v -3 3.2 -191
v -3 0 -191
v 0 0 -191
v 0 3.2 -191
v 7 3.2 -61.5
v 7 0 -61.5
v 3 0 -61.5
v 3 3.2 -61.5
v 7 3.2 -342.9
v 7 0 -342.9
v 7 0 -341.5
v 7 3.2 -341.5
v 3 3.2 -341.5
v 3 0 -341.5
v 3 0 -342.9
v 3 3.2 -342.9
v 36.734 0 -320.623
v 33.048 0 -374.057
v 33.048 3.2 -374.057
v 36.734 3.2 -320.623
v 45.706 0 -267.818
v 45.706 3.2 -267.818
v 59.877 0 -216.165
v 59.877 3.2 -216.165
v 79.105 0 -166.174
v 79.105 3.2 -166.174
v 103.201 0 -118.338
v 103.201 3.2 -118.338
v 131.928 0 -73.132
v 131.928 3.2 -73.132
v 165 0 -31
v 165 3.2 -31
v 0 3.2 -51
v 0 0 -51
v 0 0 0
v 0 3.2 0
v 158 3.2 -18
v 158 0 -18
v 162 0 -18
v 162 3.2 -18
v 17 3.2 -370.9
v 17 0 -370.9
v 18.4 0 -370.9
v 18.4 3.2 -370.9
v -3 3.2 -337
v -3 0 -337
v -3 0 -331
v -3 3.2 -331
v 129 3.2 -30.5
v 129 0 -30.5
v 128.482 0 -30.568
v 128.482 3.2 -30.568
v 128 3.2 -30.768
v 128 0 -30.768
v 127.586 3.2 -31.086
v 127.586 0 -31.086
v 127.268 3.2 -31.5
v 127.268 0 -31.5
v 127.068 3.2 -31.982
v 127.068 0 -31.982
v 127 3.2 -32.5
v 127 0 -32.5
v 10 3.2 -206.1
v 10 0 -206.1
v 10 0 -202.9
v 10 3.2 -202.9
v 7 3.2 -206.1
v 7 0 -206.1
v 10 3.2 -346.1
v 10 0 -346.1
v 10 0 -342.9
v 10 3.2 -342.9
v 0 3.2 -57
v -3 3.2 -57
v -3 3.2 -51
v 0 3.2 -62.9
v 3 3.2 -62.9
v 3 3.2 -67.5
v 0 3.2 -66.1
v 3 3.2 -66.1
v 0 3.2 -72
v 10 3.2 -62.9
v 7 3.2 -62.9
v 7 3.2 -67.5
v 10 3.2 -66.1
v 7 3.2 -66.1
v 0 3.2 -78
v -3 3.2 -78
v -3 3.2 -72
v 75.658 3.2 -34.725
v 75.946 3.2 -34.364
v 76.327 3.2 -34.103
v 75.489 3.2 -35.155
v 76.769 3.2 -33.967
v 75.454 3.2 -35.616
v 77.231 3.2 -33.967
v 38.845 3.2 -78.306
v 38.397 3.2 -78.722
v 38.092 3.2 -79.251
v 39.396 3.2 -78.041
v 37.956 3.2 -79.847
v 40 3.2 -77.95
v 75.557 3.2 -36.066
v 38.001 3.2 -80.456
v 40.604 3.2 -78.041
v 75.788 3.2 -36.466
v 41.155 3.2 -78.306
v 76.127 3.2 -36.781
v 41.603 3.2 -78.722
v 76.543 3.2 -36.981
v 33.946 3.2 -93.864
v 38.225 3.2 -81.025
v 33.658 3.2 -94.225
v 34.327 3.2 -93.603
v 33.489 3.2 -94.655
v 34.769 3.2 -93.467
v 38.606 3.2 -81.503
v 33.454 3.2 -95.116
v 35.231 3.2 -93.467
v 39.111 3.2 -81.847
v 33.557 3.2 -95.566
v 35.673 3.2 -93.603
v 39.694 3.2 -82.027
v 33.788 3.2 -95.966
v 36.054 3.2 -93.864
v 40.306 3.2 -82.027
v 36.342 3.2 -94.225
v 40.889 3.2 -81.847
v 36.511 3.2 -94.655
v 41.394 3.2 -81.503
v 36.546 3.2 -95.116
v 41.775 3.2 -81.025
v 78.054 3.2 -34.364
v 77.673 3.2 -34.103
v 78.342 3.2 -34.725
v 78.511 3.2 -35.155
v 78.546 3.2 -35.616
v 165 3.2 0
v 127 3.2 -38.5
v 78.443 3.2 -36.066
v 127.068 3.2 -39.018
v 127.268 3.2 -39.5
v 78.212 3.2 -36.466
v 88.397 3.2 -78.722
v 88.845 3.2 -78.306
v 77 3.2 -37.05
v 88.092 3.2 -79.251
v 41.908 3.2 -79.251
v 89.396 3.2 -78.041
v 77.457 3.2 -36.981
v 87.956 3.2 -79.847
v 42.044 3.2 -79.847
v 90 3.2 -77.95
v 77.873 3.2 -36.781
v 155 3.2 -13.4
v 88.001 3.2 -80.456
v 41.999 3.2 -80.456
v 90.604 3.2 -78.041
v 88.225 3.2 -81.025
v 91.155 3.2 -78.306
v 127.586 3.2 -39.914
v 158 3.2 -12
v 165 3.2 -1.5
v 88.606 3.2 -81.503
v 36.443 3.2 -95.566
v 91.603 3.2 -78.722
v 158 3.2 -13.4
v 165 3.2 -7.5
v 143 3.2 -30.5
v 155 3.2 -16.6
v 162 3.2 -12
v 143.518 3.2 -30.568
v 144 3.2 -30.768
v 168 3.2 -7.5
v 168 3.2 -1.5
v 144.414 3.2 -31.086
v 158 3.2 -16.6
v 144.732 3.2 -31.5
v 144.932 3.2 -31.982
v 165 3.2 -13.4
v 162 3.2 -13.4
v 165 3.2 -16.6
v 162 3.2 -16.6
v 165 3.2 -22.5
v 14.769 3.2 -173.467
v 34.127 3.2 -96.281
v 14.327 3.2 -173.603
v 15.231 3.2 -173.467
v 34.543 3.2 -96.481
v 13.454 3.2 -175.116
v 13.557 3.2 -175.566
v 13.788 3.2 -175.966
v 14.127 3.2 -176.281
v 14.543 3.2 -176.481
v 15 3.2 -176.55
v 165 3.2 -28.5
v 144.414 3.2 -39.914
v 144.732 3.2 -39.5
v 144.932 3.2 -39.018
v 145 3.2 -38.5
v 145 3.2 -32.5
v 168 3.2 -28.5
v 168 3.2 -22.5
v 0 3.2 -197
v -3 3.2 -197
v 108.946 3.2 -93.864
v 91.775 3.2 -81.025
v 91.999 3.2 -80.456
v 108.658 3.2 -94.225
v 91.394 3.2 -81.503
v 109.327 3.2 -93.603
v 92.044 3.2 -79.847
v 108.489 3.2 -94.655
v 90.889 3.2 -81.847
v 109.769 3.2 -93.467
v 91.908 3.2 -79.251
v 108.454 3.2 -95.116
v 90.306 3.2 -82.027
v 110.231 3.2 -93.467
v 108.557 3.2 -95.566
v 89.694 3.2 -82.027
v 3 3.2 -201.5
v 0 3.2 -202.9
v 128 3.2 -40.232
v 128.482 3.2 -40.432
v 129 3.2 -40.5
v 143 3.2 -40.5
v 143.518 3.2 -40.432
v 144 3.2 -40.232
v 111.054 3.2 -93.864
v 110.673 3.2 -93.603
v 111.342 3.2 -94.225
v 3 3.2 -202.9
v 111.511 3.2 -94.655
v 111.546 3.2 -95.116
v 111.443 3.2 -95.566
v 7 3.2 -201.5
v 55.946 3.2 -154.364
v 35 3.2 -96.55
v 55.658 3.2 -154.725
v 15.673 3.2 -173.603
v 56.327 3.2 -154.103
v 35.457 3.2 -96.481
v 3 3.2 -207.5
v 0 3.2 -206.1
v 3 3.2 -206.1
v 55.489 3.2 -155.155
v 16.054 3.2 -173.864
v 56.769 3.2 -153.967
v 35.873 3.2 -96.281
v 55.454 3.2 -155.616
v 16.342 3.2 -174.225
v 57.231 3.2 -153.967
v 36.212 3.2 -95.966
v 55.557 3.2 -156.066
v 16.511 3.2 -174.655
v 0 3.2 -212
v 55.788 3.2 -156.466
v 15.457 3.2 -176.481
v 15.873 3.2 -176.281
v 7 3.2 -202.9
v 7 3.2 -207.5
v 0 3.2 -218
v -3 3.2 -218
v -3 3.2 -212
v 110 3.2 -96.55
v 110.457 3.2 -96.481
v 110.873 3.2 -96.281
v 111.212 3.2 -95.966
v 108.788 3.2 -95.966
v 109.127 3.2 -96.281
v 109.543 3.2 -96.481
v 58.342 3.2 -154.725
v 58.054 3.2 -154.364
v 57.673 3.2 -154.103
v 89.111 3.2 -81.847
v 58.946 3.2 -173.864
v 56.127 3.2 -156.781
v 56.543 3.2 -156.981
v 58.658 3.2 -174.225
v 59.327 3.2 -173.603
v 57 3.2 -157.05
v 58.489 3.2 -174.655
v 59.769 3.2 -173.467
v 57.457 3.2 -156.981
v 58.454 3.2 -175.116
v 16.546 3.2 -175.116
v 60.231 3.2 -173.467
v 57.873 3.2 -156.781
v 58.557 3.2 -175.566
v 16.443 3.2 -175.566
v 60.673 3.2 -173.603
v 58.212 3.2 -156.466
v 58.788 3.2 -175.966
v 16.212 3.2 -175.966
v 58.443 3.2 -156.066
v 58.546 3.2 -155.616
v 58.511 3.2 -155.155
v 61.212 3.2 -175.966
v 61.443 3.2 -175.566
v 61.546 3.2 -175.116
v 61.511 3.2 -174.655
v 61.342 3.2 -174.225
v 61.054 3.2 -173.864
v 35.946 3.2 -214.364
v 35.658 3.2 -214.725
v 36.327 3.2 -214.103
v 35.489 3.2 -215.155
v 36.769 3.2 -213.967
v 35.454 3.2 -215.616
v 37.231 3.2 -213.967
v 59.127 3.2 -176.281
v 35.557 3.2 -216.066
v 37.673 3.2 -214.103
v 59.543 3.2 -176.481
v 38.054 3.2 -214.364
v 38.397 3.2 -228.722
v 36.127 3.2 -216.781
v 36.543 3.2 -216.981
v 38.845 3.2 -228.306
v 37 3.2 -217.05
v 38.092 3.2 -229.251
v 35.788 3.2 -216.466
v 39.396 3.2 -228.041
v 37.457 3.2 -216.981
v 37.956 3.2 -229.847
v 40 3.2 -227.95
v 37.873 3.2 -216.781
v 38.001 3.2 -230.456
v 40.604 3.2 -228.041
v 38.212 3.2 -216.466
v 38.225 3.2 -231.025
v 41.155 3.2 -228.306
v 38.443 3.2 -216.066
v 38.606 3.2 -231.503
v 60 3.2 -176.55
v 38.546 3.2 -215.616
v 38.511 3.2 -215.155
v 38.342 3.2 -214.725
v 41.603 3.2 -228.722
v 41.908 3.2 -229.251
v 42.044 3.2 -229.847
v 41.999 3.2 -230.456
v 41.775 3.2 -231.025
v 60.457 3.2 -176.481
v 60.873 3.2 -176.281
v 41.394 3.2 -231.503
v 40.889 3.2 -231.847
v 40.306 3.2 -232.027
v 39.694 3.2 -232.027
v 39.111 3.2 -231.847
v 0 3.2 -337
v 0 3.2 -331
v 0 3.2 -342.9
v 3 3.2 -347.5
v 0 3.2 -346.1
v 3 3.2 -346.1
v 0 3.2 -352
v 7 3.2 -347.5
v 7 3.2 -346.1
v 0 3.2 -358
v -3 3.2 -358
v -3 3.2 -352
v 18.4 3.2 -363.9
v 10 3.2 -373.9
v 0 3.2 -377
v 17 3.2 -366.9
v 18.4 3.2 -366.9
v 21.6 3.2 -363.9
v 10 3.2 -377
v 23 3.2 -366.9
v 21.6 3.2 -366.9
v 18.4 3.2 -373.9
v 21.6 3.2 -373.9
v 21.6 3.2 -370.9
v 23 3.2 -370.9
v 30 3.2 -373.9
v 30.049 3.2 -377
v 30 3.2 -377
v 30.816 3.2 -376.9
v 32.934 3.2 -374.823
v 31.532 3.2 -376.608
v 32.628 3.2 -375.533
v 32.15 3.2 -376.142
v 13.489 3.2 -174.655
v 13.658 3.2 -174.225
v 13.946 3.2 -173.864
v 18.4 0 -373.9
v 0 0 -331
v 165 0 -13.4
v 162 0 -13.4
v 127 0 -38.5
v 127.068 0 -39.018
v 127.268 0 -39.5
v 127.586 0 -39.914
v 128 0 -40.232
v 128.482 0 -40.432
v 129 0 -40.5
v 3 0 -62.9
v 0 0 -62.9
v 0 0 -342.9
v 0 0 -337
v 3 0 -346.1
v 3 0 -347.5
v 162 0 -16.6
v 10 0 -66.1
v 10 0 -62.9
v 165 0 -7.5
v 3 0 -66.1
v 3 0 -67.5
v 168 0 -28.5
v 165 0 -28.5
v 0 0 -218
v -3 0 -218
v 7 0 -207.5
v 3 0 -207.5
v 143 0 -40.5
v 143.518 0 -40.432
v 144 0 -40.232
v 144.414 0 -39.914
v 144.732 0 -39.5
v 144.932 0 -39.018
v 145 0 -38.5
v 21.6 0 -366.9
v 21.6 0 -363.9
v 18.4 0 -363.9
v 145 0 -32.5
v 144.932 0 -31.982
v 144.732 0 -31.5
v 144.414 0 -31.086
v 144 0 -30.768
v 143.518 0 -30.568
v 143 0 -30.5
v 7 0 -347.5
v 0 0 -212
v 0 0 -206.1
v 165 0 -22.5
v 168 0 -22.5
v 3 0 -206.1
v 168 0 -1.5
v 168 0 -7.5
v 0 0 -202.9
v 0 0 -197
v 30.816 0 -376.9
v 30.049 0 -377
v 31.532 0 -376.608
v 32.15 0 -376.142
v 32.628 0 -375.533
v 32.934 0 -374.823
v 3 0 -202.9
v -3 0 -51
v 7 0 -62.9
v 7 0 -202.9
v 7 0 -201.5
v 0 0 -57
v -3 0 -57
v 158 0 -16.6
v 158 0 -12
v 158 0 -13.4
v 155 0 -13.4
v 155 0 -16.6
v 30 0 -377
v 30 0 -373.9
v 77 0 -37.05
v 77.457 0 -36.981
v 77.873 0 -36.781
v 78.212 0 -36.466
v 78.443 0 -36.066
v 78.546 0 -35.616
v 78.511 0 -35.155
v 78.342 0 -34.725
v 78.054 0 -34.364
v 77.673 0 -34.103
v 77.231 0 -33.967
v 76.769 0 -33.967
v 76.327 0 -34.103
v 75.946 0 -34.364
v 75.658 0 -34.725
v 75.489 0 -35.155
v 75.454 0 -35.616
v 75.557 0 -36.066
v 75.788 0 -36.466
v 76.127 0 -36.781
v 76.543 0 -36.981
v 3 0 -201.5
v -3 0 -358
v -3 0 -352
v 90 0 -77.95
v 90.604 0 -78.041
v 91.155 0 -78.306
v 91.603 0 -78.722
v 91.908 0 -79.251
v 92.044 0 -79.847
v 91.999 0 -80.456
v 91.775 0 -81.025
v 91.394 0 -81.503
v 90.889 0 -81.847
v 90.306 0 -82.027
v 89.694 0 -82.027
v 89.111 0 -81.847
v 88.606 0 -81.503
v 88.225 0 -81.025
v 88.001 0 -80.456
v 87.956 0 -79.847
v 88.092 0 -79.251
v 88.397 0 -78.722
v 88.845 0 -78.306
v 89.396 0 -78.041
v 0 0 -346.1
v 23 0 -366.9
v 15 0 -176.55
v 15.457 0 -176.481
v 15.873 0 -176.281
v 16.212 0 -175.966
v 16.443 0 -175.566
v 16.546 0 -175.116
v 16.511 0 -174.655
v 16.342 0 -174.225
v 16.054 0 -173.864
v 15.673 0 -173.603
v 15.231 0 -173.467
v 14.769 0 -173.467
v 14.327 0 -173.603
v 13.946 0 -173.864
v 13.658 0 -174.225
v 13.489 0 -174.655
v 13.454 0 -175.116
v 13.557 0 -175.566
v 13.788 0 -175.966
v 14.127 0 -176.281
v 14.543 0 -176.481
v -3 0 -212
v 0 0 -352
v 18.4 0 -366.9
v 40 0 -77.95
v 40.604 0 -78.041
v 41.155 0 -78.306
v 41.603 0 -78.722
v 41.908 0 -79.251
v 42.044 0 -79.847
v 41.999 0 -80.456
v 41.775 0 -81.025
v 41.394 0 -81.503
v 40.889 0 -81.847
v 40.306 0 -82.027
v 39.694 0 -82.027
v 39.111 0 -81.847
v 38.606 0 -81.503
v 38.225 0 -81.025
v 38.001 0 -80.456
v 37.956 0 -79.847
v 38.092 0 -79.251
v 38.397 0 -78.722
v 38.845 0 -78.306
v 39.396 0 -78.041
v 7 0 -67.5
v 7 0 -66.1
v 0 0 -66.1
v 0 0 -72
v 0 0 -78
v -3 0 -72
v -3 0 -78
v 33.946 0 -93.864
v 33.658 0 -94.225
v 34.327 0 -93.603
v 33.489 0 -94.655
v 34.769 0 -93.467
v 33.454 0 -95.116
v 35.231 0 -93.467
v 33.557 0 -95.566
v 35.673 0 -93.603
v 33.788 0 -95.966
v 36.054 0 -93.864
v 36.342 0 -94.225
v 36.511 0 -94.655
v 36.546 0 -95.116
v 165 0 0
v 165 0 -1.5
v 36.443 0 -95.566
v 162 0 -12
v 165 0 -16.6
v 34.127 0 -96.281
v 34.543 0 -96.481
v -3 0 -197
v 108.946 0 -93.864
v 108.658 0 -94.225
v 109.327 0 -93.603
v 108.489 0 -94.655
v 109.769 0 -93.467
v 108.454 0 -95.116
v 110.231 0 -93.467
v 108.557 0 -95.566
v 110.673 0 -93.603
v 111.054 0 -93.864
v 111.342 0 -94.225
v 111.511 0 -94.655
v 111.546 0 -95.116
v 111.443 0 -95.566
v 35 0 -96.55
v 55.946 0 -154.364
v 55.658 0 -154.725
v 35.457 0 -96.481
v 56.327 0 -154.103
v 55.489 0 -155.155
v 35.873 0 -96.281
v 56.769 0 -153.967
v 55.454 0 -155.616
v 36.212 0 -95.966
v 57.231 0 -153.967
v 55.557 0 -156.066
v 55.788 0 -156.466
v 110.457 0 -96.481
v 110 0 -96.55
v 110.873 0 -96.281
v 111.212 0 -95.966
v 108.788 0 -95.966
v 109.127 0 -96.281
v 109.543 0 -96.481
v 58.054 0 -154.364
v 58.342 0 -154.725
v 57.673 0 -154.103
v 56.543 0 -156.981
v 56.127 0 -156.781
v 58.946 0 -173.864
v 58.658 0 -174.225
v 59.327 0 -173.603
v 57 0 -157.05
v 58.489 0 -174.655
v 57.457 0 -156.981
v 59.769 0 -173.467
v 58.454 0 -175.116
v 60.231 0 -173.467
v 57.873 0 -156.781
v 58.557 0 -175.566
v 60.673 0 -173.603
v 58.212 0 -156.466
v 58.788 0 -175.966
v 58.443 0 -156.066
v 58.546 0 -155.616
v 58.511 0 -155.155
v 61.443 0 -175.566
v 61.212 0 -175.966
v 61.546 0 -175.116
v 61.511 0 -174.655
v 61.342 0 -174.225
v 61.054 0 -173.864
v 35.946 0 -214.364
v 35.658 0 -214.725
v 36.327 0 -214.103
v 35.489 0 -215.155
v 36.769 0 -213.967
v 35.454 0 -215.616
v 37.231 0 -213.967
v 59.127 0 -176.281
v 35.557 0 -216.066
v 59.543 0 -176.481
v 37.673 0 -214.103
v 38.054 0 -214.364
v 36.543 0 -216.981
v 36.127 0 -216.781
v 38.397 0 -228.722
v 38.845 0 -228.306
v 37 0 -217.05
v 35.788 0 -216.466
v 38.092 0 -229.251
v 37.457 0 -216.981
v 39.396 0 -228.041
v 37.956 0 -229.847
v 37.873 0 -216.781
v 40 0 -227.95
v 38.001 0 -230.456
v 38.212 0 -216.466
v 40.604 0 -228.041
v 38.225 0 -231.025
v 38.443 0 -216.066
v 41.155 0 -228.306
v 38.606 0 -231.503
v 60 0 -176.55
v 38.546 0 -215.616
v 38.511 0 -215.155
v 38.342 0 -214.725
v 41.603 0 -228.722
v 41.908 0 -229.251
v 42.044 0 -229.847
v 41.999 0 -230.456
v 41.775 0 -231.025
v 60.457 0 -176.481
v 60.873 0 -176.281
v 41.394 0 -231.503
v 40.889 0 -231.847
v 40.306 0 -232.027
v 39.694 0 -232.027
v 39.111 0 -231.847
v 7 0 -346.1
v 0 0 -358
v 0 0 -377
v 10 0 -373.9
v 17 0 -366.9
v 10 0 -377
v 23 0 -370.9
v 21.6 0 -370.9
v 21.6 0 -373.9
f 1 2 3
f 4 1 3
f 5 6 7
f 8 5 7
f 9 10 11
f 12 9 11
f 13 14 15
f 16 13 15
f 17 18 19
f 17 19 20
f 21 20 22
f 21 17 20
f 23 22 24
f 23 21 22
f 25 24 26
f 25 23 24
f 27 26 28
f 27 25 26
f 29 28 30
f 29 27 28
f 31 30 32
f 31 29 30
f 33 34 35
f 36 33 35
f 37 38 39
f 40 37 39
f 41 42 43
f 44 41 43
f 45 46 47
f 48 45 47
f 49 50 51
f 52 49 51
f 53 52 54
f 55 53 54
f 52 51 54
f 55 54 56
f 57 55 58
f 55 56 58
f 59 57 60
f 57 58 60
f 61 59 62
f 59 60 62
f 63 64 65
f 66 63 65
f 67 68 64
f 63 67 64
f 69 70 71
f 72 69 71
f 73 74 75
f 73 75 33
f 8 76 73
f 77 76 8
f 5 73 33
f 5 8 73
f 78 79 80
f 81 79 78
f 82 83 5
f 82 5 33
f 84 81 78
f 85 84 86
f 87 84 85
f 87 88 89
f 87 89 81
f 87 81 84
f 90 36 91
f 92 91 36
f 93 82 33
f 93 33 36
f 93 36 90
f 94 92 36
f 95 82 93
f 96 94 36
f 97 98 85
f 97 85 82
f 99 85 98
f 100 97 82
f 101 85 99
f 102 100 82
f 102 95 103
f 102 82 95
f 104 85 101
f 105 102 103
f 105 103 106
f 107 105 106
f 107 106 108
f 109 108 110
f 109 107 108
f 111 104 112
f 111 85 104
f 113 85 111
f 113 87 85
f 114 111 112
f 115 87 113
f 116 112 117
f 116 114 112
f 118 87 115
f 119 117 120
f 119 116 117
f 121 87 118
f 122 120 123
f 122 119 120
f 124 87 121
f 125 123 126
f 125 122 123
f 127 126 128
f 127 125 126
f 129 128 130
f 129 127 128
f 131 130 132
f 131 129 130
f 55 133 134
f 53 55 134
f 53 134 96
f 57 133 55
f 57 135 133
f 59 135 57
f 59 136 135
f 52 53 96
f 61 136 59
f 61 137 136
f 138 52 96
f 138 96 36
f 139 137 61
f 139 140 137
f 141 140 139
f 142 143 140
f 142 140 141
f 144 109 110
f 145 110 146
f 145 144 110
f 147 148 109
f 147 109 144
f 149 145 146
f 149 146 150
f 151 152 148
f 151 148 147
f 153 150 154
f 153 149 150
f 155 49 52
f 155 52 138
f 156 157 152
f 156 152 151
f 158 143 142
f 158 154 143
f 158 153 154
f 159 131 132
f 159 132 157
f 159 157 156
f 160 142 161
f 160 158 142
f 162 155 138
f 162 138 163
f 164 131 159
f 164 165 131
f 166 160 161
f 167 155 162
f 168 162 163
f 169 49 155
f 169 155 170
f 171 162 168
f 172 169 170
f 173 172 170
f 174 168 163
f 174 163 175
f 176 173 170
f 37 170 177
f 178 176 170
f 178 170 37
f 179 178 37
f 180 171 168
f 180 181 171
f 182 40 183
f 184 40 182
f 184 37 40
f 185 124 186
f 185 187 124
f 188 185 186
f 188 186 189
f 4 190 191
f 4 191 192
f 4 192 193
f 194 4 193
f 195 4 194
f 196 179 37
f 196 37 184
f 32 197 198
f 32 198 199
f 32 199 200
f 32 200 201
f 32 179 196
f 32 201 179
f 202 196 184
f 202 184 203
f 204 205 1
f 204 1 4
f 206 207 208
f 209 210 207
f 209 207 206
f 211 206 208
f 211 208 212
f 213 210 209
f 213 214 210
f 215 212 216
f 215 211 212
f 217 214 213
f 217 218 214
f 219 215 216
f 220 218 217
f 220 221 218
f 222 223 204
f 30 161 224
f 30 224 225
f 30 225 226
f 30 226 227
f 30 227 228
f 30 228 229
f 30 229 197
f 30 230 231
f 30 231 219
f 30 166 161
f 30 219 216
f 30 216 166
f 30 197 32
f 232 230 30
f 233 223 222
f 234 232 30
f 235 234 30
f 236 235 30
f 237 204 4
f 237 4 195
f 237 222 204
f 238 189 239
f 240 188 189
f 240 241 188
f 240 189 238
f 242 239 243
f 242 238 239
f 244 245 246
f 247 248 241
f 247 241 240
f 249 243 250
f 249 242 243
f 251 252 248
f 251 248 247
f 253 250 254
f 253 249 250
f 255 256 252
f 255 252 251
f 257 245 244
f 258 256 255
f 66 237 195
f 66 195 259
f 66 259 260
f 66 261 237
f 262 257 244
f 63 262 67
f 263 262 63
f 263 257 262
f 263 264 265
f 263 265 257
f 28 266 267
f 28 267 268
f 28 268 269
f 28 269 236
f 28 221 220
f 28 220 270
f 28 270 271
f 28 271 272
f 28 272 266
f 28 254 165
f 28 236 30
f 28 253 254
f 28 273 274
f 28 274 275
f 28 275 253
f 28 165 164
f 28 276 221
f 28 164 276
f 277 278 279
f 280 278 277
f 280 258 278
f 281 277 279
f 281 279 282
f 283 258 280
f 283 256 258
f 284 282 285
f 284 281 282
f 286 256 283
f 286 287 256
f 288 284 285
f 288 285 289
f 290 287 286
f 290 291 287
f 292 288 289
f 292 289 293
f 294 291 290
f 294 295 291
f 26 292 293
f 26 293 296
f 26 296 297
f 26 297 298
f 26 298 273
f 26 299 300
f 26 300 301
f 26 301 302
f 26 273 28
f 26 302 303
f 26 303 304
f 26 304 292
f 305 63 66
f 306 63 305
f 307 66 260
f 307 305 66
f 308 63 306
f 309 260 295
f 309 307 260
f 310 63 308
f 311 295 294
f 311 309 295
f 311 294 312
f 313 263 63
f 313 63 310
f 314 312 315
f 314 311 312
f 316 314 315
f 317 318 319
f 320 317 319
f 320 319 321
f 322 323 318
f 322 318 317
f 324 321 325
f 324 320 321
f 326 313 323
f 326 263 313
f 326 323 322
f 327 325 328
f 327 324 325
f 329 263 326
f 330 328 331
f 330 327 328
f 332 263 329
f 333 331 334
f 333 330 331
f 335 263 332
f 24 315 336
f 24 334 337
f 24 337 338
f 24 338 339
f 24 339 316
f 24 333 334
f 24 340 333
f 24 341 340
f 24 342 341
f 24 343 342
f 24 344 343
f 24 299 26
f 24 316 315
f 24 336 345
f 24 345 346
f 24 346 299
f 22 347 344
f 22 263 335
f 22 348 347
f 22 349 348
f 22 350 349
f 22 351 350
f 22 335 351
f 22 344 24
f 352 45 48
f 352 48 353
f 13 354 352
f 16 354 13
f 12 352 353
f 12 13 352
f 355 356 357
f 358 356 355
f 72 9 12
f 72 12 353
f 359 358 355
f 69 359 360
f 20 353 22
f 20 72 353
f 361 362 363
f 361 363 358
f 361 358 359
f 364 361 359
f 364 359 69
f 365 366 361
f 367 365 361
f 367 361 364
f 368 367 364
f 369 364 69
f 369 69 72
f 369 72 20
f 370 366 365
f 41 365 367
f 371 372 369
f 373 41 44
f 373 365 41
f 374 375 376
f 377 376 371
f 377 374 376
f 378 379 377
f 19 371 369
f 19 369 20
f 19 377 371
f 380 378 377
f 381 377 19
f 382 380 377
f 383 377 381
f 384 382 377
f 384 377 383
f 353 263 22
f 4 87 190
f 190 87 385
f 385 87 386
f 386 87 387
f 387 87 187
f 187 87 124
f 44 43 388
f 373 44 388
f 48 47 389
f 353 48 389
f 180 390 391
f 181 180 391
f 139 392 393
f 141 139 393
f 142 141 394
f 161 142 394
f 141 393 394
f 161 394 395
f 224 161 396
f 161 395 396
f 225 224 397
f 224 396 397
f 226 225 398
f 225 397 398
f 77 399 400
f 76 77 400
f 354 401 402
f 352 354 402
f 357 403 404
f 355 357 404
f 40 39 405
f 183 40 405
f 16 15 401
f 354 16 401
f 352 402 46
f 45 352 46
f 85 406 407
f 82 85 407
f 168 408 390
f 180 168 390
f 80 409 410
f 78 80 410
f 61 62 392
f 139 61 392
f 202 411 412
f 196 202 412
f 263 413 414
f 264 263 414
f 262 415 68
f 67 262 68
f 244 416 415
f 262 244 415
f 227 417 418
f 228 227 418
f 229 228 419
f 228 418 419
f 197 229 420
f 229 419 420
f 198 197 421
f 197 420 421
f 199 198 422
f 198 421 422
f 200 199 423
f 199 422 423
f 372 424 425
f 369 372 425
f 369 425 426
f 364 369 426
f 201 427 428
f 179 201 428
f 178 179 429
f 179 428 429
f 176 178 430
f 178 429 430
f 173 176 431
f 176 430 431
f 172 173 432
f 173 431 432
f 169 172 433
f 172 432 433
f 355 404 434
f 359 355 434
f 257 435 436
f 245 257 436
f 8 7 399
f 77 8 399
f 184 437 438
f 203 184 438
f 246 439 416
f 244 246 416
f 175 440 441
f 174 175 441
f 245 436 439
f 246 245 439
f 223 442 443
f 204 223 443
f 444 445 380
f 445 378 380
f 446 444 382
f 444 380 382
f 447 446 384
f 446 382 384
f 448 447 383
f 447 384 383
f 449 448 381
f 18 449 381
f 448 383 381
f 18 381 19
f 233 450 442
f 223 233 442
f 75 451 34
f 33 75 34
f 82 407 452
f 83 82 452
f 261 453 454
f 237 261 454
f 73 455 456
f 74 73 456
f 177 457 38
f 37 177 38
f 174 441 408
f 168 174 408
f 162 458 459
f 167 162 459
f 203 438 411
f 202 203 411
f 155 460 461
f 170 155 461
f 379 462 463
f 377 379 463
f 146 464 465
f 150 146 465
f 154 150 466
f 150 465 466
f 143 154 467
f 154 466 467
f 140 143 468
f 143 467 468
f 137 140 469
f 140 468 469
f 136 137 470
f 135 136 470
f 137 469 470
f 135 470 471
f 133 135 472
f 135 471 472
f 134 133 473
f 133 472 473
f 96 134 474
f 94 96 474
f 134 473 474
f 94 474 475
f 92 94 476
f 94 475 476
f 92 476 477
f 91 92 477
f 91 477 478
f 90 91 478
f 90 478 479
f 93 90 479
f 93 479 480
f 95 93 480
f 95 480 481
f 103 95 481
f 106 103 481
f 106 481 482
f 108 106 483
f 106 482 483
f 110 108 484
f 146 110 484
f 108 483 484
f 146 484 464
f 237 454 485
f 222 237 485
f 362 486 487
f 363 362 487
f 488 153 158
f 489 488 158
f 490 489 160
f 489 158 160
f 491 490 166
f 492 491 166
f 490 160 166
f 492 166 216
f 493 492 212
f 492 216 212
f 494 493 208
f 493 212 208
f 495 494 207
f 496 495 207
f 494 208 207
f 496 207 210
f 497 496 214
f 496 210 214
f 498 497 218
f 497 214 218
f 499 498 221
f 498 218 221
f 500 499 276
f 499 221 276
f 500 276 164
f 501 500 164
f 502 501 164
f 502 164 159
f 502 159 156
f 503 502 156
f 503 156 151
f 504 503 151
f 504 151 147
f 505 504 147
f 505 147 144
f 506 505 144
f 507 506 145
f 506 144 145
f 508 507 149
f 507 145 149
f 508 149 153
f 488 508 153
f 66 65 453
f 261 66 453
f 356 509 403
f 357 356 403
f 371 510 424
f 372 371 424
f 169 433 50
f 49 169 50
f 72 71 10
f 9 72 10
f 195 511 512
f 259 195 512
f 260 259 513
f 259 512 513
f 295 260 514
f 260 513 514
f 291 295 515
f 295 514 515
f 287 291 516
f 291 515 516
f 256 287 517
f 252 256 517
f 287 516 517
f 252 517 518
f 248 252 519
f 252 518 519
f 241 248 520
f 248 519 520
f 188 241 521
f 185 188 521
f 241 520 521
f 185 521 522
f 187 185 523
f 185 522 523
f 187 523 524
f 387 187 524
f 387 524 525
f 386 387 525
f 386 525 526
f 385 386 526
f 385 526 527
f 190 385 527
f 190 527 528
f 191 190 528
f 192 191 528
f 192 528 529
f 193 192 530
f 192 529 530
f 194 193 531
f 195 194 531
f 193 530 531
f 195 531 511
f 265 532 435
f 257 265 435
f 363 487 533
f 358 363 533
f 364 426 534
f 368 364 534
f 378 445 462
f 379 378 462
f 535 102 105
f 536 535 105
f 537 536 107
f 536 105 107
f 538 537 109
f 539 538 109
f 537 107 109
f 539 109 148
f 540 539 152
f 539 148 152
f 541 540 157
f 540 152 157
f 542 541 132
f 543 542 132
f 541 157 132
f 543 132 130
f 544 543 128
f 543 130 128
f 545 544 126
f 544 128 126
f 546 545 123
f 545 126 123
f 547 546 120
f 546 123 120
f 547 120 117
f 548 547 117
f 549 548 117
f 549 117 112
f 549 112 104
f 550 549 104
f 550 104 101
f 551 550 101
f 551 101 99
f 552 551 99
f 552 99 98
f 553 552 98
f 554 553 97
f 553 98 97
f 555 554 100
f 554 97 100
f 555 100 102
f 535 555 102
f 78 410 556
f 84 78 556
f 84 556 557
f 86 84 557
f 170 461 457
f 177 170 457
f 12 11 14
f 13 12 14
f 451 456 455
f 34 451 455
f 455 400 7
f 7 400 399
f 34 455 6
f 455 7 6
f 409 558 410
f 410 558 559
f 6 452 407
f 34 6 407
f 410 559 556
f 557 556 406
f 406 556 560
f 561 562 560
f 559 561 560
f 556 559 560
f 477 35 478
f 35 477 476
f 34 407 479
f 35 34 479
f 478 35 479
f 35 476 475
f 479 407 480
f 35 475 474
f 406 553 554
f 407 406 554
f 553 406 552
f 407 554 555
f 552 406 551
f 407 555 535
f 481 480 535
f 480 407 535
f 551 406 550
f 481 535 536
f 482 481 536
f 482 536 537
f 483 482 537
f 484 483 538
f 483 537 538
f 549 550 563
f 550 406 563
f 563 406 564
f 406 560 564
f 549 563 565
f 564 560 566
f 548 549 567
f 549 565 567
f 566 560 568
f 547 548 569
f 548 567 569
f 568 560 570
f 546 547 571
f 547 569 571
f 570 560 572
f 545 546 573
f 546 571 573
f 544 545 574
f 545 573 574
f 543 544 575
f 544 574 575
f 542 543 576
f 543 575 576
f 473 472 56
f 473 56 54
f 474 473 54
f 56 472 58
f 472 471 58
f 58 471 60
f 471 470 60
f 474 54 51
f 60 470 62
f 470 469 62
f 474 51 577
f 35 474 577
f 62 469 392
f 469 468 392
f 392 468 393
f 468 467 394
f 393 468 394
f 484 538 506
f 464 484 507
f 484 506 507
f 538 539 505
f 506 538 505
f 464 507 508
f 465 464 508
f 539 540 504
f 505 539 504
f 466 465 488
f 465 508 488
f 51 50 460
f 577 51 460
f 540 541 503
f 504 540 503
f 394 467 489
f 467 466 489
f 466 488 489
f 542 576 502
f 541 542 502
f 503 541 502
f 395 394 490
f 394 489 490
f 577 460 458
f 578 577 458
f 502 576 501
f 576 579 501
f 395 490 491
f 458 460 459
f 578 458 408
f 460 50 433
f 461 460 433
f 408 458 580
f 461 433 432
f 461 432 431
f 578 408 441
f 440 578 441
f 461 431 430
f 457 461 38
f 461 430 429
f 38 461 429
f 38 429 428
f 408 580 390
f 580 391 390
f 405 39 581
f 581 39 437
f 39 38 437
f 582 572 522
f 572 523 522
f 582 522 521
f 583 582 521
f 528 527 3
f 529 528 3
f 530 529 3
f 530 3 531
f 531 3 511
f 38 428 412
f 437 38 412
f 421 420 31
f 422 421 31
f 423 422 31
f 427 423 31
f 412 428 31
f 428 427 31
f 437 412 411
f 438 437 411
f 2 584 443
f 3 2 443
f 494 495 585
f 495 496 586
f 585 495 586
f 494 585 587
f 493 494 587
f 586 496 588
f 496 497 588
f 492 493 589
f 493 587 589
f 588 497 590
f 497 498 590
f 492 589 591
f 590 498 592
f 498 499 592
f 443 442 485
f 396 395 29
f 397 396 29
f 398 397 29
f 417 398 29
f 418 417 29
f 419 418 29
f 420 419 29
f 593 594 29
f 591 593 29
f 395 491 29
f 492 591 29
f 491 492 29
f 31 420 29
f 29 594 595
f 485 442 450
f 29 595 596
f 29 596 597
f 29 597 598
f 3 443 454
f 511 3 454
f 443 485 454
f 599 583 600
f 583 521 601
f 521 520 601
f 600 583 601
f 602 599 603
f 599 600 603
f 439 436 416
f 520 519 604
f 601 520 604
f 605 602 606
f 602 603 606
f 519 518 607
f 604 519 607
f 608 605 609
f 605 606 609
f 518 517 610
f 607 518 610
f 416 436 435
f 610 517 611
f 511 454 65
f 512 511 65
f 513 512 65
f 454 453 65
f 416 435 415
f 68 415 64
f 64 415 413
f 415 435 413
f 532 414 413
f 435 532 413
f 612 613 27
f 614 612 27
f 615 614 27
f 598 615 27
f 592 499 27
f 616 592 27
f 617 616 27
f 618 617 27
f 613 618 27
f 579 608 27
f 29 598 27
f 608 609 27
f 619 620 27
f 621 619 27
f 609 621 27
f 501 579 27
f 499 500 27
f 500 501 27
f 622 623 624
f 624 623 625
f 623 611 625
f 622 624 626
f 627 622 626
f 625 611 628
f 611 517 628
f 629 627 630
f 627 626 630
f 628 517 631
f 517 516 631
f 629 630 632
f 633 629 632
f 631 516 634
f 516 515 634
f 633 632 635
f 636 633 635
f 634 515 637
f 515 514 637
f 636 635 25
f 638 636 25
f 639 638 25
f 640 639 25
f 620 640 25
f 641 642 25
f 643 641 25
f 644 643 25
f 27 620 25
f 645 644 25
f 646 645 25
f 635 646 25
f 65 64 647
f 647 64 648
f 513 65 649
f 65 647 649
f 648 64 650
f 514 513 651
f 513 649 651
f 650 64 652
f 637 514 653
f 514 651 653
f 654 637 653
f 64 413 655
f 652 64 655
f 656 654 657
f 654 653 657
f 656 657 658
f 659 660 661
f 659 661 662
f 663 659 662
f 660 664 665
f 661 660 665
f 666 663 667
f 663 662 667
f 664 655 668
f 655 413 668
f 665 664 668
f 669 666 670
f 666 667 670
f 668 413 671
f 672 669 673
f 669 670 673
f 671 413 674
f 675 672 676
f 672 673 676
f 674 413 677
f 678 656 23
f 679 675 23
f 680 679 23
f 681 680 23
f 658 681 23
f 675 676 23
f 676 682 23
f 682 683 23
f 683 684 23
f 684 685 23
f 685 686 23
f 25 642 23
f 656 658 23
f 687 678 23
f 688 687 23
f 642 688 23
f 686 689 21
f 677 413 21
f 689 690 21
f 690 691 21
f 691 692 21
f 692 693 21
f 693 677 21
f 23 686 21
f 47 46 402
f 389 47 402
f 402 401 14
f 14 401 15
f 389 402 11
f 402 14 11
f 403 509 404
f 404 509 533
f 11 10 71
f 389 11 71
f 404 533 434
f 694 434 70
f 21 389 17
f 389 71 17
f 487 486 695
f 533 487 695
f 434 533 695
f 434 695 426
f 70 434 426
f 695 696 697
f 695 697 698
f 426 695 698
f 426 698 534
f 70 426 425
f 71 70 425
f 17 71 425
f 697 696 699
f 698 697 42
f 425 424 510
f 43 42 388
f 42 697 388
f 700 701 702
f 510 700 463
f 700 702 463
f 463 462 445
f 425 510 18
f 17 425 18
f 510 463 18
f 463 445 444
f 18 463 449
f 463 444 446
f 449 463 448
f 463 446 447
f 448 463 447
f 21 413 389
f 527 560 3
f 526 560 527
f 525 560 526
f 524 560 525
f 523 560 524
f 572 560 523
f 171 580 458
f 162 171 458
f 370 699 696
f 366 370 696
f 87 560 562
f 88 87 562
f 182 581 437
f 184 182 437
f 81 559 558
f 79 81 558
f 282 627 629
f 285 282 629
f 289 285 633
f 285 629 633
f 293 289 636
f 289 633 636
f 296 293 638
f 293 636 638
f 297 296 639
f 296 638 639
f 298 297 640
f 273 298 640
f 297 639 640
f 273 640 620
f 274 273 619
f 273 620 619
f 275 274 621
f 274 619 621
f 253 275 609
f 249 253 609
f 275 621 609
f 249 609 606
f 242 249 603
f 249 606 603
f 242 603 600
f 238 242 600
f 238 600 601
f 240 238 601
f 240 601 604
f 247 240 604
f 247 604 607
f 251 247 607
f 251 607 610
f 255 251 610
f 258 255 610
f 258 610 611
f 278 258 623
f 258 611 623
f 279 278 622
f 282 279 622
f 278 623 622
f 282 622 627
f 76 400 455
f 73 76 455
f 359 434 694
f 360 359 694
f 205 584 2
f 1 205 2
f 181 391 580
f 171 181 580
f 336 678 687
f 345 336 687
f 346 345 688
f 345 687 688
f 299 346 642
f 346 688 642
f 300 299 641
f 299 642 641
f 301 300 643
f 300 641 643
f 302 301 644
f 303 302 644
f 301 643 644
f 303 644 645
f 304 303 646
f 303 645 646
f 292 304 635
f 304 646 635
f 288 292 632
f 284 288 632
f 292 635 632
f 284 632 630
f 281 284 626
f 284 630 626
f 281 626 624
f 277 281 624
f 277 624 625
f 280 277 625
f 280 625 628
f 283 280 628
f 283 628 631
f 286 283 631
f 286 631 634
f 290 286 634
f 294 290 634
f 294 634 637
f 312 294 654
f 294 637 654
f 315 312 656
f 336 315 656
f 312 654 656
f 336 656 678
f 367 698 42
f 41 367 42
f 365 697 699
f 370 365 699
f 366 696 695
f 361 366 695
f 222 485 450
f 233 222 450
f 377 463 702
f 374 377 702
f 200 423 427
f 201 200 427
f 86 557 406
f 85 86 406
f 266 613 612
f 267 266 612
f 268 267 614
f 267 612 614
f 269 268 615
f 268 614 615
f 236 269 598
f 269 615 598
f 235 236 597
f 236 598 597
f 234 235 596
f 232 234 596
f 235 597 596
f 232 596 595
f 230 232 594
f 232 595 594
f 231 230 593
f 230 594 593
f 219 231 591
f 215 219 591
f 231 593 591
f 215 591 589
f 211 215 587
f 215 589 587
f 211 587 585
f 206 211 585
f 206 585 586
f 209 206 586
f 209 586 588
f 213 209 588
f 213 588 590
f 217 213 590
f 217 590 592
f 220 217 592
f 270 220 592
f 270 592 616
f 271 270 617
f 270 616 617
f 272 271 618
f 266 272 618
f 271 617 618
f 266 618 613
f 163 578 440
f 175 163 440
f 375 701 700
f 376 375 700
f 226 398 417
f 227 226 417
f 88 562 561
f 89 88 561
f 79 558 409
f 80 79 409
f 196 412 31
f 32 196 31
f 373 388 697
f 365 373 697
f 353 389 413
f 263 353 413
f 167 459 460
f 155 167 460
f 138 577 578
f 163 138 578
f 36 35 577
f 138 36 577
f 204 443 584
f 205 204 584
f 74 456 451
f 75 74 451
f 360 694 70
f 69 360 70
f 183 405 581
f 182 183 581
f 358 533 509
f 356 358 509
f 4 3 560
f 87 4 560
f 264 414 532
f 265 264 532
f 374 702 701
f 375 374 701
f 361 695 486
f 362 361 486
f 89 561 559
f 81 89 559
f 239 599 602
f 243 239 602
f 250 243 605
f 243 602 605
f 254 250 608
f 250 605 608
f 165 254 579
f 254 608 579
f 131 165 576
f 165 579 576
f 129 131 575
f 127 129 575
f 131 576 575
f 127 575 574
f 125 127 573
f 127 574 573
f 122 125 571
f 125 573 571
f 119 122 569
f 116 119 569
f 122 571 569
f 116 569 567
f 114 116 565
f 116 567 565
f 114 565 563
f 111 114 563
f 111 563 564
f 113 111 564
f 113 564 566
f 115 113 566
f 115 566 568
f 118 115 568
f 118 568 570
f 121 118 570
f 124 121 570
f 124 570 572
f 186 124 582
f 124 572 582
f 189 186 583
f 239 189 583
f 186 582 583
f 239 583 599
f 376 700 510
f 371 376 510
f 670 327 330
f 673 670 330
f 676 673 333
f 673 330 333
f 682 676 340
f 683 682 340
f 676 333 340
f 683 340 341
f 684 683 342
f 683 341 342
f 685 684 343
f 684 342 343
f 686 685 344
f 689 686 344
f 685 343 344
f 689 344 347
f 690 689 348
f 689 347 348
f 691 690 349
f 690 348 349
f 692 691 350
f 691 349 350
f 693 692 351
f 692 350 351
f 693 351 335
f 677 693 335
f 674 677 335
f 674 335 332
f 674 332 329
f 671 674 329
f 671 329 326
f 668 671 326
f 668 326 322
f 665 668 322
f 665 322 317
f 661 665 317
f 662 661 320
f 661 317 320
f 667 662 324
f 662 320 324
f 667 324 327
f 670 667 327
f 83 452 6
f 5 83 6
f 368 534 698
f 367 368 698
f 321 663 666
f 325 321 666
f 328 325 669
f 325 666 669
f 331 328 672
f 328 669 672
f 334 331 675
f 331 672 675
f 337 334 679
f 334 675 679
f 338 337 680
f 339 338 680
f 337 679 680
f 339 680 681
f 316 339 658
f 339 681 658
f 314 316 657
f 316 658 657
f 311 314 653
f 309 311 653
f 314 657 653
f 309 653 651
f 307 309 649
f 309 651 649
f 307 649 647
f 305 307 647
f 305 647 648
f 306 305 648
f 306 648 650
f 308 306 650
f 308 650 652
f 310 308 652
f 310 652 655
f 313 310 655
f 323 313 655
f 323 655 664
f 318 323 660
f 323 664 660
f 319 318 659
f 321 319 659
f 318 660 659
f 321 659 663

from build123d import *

# Parameters (mm, degrees)
SALIENTE_EXTRUIR1_DEPTH = 3.2
CORTAR_EXTRUIR1_DEPTH   = 3.2
REDONDEO1_R             = 3
CROQUIS3_R              = 2.05
CORTAR_EXTRUIR2_DEPTH   = 3.2
CORTAR_EXTRUIR3_DEPTH   = 3.2
CROQUIS5_R              = 1.55
CORTAR_EXTRUIR4_DEPTH   = 3.2


with BuildPart() as part:
    # Croquis1 → Saliente-Extruir1 (new body)
    with BuildSketch(Plane(origin=(0, 0, 0), x_dir=(1, 0, 0), z_dir=(0, 1, 0))):
        Polygon((7, 66.1), (10, 66.1), (10, 62.9), (7, 62.9), (7, 61.5), (3, 61.5), (3, 62.9), (0, 62.9), (0, 57), (-3, 57), (-3, 51), (0, 51), (0, 0), (165, 0), (165, 1.5), (168, 1.5), (168, 7.5), (165, 7.5), (165, 13.4), (162, 13.4), (162, 12), (158, 12), (158, 13.4), (155, 13.4), (155, 16.6), (158, 16.6), (158, 18), (162, 18), (162, 16.6), (165, 16.6), (165, 22.5), (168, 22.5), (168, 28.5), (165, 28.5), (165, 377), (30, 377), (30, 373.9), (21.6, 373.9), (21.6, 370.9), (23, 370.9), (23, 366.9), (21.6, 366.9), (21.6, 363.9), (18.4, 363.9), (18.4, 366.9), (17, 366.9), (17, 370.9), (18.4, 370.9), (18.4, 373.9), (10, 373.9), (10, 377), (0, 377), (0, 358), (-3, 358), (-3, 352), (0, 352), (0, 346.1), (3, 346.1), (3, 347.5), (7, 347.5), (7, 346.1), (10, 346.1), (10, 342.9), (7, 342.9), (7, 341.5), (3, 341.5), (3, 342.9), (0, 342.9), (0, 337), (-3, 337), (-3, 331), (0, 331), (0, 218), (-3, 218), (-3, 212), (0, 212), (0, 206.1), (3, 206.1), (3, 207.5), (7, 207.5), (7, 206.1), (10, 206.1), (10, 202.9), (7, 202.9), (7, 201.5), (3, 201.5), (3, 202.9), (0, 202.9), (0, 197), (-3, 197), (-3, 191), (0, 191), (0, 78), (-3, 78), (-3, 72), (0, 72), (0, 66.1), (3, 66.1), (3, 67.5), (7, 67.5), align=None)
    extrude(amount=SALIENTE_EXTRUIR1_DEPTH)

    # Croquis2 → Cortar-Extruir1 (cut)
    with BuildSketch(Plane.XZ):
        with BuildLine():
            Line((165, -377), (33, -377))
            ThreePointArc((33, -377), (68.343071274, -192.304293087), (165, -31))
            Line((165, -31), (165, -377))
        make_face()
    extrude(amount=-CORTAR_EXTRUIR1_DEPTH, mode=Mode.SUBTRACT)

    # Redondeo1
    redondeo1_edges = [part.edges().sort_by_distance(p)[0] for p in [
        (33, 1.6, -377),
    ]]
    fillet(redondeo1_edges, radius=REDONDEO1_R)

    # Croquis3 → Cortar-Extruir2 (cut)
    with BuildSketch(Plane(origin=(0, 3.2, 0), x_dir=(1, 0, 0), z_dir=(0, 1, 0))):
        with Locations(Location((40, 80, 0), (0, 0, 270))):
            Circle(CROQUIS3_R)
        with Locations(Location((90, 80, 0), (0, 0, 270))):
            Circle(CROQUIS3_R)
        with Locations(Location((40, 230, 0), (0, 0, 270))):
            Circle(CROQUIS3_R)
    extrude(amount=-CORTAR_EXTRUIR2_DEPTH, mode=Mode.SUBTRACT)

    # Croquis4 → Cortar-Extruir3 (cut)
    with BuildSketch(Plane.XZ):
        with BuildLine():
            Line((143, -30.5), (129, -30.5))
            ThreePointArc((129, -30.5), (127.585786438, -31.085786438), (127, -32.5))
            Line((127, -32.5), (127, -38.5))
            ThreePointArc((127, -38.5), (127.585786438, -39.914213562), (129, -40.5))
            Line((129, -40.5), (143, -40.5))
            ThreePointArc((143, -40.5), (144.414213562, -39.914213562), (145, -38.5))
            Line((145, -38.5), (145, -32.5))
            ThreePointArc((145, -32.5), (144.414213562, -31.085786438), (143, -30.5))
        make_face()
    extrude(amount=-CORTAR_EXTRUIR3_DEPTH, mode=Mode.SUBTRACT)

    # Croquis5 → Cortar-Extruir4 (cut)
    with BuildSketch(Plane.XZ):
        with Locations(Location((110, -95, 0), (0, 0, 270))):
            Circle(CROQUIS5_R)
        with Locations(Location((35, -95, 0), (0, 0, 270))):
            Circle(CROQUIS5_R)
        with Locations(Location((15, -175, 0), (0, 0, 270))):
            Circle(CROQUIS5_R)
        with Locations(Location((60, -175, 0), (0, 0, 270))):
            Circle(CROQUIS5_R)
        with Locations(Location((77, -35.5, 0), (0, 0, 270))):
            Circle(CROQUIS5_R)
        with Locations(Location((37, -215.5, 0), (0, 0, 270))):
            Circle(CROQUIS5_R)
        with Locations(Location((57, -155.5, 0), (0, 0, 270))):
            Circle(CROQUIS5_R)
    extrude(amount=-CORTAR_EXTRUIR4_DEPTH, mode=Mode.SUBTRACT)


solid = part.part
